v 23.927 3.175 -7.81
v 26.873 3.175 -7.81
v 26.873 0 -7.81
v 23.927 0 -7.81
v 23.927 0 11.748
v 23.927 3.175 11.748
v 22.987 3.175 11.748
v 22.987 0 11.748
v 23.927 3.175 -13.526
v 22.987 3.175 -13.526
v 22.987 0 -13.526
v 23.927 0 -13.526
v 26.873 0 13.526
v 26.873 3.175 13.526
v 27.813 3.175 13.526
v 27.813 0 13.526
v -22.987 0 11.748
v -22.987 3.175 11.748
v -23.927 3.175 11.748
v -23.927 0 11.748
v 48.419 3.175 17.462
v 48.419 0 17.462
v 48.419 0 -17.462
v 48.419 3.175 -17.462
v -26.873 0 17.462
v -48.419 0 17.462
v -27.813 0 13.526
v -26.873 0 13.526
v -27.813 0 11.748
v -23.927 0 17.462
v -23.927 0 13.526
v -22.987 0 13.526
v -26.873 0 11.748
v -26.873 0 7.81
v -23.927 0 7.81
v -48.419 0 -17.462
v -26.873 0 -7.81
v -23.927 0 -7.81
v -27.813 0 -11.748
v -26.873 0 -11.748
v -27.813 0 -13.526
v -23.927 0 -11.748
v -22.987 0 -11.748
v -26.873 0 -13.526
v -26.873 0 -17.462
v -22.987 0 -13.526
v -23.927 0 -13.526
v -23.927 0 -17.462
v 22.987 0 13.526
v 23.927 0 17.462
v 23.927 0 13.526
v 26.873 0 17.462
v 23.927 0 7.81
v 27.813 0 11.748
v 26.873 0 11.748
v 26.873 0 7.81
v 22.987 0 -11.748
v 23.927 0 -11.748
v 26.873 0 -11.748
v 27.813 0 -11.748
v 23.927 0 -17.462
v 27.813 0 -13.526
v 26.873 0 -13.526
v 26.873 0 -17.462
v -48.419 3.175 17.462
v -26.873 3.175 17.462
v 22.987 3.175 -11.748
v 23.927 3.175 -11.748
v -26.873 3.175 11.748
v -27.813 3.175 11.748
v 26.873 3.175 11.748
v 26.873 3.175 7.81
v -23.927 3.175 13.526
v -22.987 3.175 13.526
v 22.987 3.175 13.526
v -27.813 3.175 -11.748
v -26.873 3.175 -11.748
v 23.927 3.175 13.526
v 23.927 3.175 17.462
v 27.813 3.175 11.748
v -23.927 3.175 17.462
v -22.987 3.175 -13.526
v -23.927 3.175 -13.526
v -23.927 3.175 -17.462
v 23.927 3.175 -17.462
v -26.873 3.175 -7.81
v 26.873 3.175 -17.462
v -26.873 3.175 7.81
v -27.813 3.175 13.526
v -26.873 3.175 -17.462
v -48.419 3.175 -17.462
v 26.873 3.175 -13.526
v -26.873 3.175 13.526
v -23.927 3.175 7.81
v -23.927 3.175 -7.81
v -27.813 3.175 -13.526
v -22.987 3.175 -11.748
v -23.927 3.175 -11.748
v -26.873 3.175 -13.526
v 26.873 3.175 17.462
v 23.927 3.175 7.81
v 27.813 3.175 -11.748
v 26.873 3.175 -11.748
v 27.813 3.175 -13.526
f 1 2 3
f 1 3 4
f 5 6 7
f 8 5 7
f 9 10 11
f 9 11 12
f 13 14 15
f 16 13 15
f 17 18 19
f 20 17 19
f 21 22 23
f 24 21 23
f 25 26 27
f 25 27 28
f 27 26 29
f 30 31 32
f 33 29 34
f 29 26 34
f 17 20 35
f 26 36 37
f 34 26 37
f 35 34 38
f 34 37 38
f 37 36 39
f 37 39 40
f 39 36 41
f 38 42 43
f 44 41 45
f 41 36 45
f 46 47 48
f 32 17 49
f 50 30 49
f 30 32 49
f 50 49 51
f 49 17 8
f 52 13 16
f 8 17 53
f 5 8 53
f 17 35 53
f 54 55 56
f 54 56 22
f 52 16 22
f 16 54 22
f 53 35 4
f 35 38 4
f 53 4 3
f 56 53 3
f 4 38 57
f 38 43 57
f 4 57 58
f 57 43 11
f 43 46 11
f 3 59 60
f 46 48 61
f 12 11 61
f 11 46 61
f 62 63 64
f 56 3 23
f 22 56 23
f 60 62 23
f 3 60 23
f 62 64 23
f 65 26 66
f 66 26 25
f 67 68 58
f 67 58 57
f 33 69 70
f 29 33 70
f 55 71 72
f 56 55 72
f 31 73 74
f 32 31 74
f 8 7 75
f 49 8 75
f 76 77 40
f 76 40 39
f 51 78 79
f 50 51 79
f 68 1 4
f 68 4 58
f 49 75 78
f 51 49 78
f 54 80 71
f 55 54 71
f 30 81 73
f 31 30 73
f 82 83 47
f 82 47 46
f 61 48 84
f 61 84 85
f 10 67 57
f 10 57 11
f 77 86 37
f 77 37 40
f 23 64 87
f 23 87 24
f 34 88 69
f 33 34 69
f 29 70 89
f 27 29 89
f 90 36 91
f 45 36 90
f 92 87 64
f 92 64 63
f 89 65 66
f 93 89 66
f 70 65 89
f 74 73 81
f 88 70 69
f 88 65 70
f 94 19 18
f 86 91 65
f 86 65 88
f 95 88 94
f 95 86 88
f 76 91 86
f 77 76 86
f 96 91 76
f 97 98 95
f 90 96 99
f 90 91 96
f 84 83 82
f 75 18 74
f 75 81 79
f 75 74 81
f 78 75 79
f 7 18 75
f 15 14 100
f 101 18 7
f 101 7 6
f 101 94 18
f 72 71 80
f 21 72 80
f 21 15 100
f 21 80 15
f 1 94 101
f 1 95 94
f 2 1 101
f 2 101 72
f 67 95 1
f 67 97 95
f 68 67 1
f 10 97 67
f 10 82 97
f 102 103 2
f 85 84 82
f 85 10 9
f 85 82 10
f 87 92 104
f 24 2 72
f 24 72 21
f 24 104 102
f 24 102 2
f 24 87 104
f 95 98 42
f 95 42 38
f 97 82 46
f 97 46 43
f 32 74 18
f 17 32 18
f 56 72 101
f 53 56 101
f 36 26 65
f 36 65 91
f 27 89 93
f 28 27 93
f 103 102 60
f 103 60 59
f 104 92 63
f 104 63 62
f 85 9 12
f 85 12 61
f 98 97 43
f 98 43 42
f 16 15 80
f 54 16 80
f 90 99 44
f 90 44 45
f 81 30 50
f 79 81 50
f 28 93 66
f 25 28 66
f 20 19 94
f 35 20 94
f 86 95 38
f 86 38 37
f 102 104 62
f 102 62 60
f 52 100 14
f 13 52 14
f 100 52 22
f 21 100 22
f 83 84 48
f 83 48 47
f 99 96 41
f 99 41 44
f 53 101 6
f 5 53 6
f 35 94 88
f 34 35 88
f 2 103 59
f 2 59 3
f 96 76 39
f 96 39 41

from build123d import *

# Parameters (mm, degrees)
SKETCH1_W           = 96.8375
SKETCH1_H           = 34.925
BOSS_EXTRUDE1_DEPTH = 3.175
CUT_EXTRUDE2_DEPTH  = 52.56932114


with BuildPart() as part:
    # Sketch1 → Boss-Extrude1 (new body)
    with BuildSketch(Plane(origin=(0, 0, 0), x_dir=(1, 0, 0), z_dir=(0, 1, 0))):
        Rectangle(SKETCH1_W, SKETCH1_H)
    extrude(amount=BOSS_EXTRUDE1_DEPTH)

    # Sketch3 → Cut-Extrude2 (cut, through all)
    with BuildSketch(Plane(origin=(0, 3.175, 0), x_dir=(1, 0, 0), z_dir=(0, 1, 0))):
        Polygon((-26.8732, 17.4625), (-23.9268, 17.4625), (-23.9268, 13.5255), (-22.987, 13.5255), (-22.987, 11.7475), (-23.9268, 11.7475), (-23.9268, 7.8105), (-26.8732, 7.8105), (-26.8732, 11.7475), (-27.813, 11.7475), (-27.813, 13.5255), (-26.8732, 13.5255), align=None)
        Polygon((23.9268, 17.4625), (26.8732, 17.4625), (26.8732, 13.5255), (27.813, 13.5255), (27.813, 11.7475), (26.8732, 11.7475), (26.8732, 7.8105), (23.9268, 7.8105), (23.9268, 11.7475), (22.987, 11.7475), (22.987, 13.5255), (23.9268, 13.5255), align=None)
        Polygon((26.8732, -11.7475), (26.8732, -7.8105), (23.9268, -7.8105), (23.9268, -11.7475), (22.987, -11.7475), (22.987, -13.5255), (23.9268, -13.5255), (23.9268, -17.4625), (26.8732, -17.4625), (26.8732, -13.5255), (27.813, -13.5255), (27.813, -11.7475), align=None)
        Polygon((-23.9268, -11.7475), (-23.9268, -7.8105), (-26.8732, -7.8105), (-26.8732, -11.7475), (-27.813, -11.7475), (-27.813, -13.5255), (-26.8732, -13.5255), (-26.8732, -17.4625), (-23.9268, -17.4625), (-23.9268, -13.5255), (-22.987, -13.5255), (-22.987, -11.7475), align=None)
    extrude(amount=-CUT_EXTRUDE2_DEPTH, mode=Mode.SUBTRACT)


solid = part.part
